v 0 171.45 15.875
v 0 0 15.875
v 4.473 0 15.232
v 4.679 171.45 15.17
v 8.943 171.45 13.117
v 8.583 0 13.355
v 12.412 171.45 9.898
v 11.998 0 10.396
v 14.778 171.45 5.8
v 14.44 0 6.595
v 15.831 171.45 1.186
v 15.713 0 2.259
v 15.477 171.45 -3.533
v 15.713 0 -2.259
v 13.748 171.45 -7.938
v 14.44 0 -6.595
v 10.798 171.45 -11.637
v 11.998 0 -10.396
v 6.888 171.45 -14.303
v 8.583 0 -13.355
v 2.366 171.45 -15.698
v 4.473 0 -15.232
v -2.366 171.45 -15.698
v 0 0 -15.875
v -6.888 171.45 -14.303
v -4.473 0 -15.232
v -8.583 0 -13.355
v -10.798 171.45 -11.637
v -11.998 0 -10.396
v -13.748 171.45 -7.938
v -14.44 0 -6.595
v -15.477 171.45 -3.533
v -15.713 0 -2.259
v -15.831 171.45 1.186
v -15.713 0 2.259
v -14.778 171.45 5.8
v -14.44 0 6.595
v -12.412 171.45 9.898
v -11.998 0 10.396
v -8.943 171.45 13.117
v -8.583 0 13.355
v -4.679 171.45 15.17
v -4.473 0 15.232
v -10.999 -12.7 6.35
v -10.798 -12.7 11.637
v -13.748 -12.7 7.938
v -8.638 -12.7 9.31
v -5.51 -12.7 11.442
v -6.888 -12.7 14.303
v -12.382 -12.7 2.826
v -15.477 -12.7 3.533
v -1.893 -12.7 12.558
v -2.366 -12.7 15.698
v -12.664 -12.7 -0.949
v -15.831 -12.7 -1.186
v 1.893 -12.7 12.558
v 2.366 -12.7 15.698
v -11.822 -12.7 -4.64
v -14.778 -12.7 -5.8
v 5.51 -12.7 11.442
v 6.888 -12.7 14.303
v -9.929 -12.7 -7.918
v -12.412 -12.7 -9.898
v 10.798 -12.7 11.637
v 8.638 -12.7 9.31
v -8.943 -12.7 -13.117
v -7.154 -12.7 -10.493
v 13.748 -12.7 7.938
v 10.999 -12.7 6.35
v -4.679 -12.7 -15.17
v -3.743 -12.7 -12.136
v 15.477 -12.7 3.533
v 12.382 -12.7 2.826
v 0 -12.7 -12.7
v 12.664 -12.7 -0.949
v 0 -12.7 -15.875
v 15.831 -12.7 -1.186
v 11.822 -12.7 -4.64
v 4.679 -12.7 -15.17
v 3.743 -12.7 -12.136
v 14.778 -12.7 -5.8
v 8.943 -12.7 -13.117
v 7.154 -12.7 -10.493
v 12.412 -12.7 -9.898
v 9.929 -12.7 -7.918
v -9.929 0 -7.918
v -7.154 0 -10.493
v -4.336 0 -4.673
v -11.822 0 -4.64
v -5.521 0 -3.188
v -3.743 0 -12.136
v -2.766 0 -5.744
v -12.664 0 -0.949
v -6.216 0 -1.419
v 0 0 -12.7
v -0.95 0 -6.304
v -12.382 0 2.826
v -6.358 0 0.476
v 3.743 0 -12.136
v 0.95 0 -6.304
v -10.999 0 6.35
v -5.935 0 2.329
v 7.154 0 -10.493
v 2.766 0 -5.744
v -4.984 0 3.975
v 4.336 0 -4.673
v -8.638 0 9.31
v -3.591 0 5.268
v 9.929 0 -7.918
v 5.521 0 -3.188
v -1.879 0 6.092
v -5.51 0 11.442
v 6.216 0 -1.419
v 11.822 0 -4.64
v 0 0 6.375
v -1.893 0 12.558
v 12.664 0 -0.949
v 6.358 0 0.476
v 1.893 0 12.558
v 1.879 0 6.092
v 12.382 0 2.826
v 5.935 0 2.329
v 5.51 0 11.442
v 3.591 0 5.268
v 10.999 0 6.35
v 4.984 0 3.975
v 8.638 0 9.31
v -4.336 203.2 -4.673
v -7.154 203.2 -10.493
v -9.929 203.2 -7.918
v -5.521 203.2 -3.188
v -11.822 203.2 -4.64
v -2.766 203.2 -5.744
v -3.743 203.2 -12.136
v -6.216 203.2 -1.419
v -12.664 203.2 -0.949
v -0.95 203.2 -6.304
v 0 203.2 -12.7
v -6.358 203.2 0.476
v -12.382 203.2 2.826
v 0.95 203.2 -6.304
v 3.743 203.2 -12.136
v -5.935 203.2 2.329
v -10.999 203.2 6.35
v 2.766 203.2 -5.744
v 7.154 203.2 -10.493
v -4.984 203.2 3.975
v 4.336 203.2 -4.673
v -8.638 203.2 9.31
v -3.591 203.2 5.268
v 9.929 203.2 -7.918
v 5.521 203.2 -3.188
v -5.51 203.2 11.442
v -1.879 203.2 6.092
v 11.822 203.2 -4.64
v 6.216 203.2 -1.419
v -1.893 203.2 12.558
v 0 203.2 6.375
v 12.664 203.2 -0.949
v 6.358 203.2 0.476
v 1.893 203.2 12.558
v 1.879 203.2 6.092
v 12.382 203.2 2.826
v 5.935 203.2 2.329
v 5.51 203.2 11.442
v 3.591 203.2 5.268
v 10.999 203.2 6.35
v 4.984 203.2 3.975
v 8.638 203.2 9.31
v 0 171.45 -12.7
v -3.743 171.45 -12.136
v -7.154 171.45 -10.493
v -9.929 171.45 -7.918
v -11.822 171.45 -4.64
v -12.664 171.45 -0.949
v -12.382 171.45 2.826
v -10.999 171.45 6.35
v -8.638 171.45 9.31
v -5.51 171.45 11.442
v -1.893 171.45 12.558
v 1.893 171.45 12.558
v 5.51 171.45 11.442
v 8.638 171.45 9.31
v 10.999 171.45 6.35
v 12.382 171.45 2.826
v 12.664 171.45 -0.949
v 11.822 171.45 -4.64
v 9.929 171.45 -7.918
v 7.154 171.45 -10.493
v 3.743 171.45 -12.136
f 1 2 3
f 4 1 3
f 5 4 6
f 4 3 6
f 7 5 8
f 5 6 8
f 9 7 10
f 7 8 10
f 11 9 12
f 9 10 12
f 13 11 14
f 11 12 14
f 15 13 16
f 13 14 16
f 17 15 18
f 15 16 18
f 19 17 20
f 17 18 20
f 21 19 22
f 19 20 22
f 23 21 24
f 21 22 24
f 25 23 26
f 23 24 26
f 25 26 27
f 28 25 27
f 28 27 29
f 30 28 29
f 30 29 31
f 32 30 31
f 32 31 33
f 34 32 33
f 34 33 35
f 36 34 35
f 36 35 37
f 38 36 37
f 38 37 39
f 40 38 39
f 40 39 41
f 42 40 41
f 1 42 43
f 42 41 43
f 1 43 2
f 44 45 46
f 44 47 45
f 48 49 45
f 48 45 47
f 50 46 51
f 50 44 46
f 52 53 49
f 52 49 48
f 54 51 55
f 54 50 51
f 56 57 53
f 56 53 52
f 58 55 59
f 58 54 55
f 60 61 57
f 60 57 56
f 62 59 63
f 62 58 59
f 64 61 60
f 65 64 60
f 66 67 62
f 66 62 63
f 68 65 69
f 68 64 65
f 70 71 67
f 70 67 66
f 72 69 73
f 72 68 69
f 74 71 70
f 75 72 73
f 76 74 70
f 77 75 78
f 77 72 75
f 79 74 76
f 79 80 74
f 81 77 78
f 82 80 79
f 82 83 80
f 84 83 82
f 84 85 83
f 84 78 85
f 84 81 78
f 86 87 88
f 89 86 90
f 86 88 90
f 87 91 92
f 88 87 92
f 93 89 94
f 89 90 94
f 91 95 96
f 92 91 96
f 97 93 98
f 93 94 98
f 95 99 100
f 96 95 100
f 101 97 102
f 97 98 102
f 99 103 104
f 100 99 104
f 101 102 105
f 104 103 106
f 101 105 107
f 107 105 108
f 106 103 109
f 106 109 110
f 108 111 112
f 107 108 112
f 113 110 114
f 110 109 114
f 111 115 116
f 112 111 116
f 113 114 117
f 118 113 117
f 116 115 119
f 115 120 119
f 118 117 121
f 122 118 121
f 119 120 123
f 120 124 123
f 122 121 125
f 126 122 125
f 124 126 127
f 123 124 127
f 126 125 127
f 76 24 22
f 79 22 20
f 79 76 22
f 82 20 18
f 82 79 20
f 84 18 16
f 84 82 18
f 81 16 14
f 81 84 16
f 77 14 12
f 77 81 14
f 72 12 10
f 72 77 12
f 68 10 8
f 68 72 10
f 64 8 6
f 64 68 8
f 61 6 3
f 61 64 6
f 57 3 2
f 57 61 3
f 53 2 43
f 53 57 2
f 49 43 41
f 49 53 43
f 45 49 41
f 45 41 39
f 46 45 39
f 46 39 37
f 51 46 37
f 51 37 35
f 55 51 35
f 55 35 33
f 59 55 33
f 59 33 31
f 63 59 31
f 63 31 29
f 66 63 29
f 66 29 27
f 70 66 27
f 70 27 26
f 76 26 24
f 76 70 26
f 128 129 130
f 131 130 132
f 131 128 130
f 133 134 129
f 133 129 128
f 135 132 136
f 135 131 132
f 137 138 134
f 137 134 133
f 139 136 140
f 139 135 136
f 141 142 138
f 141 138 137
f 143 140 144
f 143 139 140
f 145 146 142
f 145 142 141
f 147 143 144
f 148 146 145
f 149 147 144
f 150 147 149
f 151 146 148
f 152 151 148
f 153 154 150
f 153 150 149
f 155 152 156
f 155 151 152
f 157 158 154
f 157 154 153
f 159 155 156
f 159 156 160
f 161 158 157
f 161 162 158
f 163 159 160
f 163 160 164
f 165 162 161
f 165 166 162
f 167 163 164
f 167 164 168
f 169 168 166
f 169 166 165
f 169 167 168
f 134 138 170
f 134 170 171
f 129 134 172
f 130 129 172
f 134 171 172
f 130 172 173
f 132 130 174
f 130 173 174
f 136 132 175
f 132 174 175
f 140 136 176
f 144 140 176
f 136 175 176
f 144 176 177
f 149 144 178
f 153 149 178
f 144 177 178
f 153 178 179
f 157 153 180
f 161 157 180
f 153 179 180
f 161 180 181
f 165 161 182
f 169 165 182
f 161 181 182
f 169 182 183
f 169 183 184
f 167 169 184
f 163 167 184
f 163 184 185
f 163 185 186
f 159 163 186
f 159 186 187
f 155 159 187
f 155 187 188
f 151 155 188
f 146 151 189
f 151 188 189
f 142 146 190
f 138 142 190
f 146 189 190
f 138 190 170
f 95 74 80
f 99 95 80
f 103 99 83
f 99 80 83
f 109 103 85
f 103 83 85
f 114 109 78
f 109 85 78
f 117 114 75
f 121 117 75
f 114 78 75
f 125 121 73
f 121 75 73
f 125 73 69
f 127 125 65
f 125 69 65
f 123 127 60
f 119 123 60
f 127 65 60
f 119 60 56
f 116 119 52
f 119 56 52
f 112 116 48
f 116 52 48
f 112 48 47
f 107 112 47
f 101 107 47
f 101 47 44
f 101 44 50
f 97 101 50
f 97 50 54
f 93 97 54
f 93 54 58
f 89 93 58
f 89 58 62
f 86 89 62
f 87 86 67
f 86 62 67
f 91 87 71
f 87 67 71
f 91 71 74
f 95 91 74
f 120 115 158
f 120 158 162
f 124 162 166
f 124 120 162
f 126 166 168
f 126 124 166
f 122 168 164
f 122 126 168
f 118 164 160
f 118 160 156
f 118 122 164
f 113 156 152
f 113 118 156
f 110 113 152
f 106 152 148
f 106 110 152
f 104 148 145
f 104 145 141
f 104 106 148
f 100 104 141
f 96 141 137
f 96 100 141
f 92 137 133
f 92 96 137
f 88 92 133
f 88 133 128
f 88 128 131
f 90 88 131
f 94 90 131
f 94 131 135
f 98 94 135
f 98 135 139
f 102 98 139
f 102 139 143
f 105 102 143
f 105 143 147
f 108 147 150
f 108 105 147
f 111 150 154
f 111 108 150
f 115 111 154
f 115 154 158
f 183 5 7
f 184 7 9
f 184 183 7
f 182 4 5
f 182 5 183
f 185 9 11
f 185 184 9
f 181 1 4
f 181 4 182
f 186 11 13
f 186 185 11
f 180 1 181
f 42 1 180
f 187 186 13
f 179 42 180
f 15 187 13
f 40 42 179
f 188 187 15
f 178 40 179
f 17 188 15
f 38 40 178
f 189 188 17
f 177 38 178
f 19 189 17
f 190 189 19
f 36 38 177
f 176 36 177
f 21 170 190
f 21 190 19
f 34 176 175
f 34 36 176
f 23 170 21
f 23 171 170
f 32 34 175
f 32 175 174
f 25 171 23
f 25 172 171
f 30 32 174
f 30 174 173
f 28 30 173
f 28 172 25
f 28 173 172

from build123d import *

# Parameters (mm, degrees)
SKETCH1_R           = 15.875
SKETCH1_R_2         = 6.3754
BOSS_EXTRUDE1_DEPTH = 203.2
BOSS_EXTRUDE2_START = 12.7
SKETCH2_R           = 15.875
SKETCH2_R_2         = 12.7
BOSS_EXTRUDE2_DEPTH = 12.7
CUT_EXTRUDE1_START  = -31.75
SKETCH3_R           = 15.875
SKETCH3_R_2         = 12.7
CUT_EXTRUDE1_DEPTH  = 31.75


with BuildPart() as part:
    # Sketch1 → Boss-Extrude1 (new body)
    with BuildSketch(Plane(origin=(0, 0, 0), x_dir=(1, 0, 0), z_dir=(0, 1, 0))):
        with Locations(Location((0, 0, 0), (0, 0, 270))):
            Circle(SKETCH1_R)
        with Locations(Location((0, 0, 0), (0, 0, 270))):
            Circle(SKETCH1_R_2, mode=Mode.SUBTRACT)
    extrude(amount=BOSS_EXTRUDE1_DEPTH)

    # Sketch2 → Boss-Extrude2 (add)
    with BuildSketch(Plane.XZ.offset(BOSS_EXTRUDE2_START)):
        with Locations(Location((0, 0, 0), (0, 0, 270))):
            Circle(SKETCH2_R)
        with Locations(Location((0, 0, 0), (0, 0, 270))):
            Circle(SKETCH2_R_2, mode=Mode.SUBTRACT)
    extrude(amount=-BOSS_EXTRUDE2_DEPTH)

    # Sketch3 → Cut-Extrude1 (cut)
    with BuildSketch(Plane(origin=(0, 203.2, 0), x_dir=(1, 0, 0), z_dir=(0, 1, 0)).offset(CUT_EXTRUDE1_START)):
        with Locations(Location((0, 0, 0), (0, 0, 90))):
            Circle(SKETCH3_R)
        with Locations(Location((0, 0, 0), (0, 0, 90))):
            Circle(SKETCH3_R_2, mode=Mode.SUBTRACT)
    extrude(amount=CUT_EXTRUDE1_DEPTH, mode=Mode.SUBTRACT)


solid = part.part
